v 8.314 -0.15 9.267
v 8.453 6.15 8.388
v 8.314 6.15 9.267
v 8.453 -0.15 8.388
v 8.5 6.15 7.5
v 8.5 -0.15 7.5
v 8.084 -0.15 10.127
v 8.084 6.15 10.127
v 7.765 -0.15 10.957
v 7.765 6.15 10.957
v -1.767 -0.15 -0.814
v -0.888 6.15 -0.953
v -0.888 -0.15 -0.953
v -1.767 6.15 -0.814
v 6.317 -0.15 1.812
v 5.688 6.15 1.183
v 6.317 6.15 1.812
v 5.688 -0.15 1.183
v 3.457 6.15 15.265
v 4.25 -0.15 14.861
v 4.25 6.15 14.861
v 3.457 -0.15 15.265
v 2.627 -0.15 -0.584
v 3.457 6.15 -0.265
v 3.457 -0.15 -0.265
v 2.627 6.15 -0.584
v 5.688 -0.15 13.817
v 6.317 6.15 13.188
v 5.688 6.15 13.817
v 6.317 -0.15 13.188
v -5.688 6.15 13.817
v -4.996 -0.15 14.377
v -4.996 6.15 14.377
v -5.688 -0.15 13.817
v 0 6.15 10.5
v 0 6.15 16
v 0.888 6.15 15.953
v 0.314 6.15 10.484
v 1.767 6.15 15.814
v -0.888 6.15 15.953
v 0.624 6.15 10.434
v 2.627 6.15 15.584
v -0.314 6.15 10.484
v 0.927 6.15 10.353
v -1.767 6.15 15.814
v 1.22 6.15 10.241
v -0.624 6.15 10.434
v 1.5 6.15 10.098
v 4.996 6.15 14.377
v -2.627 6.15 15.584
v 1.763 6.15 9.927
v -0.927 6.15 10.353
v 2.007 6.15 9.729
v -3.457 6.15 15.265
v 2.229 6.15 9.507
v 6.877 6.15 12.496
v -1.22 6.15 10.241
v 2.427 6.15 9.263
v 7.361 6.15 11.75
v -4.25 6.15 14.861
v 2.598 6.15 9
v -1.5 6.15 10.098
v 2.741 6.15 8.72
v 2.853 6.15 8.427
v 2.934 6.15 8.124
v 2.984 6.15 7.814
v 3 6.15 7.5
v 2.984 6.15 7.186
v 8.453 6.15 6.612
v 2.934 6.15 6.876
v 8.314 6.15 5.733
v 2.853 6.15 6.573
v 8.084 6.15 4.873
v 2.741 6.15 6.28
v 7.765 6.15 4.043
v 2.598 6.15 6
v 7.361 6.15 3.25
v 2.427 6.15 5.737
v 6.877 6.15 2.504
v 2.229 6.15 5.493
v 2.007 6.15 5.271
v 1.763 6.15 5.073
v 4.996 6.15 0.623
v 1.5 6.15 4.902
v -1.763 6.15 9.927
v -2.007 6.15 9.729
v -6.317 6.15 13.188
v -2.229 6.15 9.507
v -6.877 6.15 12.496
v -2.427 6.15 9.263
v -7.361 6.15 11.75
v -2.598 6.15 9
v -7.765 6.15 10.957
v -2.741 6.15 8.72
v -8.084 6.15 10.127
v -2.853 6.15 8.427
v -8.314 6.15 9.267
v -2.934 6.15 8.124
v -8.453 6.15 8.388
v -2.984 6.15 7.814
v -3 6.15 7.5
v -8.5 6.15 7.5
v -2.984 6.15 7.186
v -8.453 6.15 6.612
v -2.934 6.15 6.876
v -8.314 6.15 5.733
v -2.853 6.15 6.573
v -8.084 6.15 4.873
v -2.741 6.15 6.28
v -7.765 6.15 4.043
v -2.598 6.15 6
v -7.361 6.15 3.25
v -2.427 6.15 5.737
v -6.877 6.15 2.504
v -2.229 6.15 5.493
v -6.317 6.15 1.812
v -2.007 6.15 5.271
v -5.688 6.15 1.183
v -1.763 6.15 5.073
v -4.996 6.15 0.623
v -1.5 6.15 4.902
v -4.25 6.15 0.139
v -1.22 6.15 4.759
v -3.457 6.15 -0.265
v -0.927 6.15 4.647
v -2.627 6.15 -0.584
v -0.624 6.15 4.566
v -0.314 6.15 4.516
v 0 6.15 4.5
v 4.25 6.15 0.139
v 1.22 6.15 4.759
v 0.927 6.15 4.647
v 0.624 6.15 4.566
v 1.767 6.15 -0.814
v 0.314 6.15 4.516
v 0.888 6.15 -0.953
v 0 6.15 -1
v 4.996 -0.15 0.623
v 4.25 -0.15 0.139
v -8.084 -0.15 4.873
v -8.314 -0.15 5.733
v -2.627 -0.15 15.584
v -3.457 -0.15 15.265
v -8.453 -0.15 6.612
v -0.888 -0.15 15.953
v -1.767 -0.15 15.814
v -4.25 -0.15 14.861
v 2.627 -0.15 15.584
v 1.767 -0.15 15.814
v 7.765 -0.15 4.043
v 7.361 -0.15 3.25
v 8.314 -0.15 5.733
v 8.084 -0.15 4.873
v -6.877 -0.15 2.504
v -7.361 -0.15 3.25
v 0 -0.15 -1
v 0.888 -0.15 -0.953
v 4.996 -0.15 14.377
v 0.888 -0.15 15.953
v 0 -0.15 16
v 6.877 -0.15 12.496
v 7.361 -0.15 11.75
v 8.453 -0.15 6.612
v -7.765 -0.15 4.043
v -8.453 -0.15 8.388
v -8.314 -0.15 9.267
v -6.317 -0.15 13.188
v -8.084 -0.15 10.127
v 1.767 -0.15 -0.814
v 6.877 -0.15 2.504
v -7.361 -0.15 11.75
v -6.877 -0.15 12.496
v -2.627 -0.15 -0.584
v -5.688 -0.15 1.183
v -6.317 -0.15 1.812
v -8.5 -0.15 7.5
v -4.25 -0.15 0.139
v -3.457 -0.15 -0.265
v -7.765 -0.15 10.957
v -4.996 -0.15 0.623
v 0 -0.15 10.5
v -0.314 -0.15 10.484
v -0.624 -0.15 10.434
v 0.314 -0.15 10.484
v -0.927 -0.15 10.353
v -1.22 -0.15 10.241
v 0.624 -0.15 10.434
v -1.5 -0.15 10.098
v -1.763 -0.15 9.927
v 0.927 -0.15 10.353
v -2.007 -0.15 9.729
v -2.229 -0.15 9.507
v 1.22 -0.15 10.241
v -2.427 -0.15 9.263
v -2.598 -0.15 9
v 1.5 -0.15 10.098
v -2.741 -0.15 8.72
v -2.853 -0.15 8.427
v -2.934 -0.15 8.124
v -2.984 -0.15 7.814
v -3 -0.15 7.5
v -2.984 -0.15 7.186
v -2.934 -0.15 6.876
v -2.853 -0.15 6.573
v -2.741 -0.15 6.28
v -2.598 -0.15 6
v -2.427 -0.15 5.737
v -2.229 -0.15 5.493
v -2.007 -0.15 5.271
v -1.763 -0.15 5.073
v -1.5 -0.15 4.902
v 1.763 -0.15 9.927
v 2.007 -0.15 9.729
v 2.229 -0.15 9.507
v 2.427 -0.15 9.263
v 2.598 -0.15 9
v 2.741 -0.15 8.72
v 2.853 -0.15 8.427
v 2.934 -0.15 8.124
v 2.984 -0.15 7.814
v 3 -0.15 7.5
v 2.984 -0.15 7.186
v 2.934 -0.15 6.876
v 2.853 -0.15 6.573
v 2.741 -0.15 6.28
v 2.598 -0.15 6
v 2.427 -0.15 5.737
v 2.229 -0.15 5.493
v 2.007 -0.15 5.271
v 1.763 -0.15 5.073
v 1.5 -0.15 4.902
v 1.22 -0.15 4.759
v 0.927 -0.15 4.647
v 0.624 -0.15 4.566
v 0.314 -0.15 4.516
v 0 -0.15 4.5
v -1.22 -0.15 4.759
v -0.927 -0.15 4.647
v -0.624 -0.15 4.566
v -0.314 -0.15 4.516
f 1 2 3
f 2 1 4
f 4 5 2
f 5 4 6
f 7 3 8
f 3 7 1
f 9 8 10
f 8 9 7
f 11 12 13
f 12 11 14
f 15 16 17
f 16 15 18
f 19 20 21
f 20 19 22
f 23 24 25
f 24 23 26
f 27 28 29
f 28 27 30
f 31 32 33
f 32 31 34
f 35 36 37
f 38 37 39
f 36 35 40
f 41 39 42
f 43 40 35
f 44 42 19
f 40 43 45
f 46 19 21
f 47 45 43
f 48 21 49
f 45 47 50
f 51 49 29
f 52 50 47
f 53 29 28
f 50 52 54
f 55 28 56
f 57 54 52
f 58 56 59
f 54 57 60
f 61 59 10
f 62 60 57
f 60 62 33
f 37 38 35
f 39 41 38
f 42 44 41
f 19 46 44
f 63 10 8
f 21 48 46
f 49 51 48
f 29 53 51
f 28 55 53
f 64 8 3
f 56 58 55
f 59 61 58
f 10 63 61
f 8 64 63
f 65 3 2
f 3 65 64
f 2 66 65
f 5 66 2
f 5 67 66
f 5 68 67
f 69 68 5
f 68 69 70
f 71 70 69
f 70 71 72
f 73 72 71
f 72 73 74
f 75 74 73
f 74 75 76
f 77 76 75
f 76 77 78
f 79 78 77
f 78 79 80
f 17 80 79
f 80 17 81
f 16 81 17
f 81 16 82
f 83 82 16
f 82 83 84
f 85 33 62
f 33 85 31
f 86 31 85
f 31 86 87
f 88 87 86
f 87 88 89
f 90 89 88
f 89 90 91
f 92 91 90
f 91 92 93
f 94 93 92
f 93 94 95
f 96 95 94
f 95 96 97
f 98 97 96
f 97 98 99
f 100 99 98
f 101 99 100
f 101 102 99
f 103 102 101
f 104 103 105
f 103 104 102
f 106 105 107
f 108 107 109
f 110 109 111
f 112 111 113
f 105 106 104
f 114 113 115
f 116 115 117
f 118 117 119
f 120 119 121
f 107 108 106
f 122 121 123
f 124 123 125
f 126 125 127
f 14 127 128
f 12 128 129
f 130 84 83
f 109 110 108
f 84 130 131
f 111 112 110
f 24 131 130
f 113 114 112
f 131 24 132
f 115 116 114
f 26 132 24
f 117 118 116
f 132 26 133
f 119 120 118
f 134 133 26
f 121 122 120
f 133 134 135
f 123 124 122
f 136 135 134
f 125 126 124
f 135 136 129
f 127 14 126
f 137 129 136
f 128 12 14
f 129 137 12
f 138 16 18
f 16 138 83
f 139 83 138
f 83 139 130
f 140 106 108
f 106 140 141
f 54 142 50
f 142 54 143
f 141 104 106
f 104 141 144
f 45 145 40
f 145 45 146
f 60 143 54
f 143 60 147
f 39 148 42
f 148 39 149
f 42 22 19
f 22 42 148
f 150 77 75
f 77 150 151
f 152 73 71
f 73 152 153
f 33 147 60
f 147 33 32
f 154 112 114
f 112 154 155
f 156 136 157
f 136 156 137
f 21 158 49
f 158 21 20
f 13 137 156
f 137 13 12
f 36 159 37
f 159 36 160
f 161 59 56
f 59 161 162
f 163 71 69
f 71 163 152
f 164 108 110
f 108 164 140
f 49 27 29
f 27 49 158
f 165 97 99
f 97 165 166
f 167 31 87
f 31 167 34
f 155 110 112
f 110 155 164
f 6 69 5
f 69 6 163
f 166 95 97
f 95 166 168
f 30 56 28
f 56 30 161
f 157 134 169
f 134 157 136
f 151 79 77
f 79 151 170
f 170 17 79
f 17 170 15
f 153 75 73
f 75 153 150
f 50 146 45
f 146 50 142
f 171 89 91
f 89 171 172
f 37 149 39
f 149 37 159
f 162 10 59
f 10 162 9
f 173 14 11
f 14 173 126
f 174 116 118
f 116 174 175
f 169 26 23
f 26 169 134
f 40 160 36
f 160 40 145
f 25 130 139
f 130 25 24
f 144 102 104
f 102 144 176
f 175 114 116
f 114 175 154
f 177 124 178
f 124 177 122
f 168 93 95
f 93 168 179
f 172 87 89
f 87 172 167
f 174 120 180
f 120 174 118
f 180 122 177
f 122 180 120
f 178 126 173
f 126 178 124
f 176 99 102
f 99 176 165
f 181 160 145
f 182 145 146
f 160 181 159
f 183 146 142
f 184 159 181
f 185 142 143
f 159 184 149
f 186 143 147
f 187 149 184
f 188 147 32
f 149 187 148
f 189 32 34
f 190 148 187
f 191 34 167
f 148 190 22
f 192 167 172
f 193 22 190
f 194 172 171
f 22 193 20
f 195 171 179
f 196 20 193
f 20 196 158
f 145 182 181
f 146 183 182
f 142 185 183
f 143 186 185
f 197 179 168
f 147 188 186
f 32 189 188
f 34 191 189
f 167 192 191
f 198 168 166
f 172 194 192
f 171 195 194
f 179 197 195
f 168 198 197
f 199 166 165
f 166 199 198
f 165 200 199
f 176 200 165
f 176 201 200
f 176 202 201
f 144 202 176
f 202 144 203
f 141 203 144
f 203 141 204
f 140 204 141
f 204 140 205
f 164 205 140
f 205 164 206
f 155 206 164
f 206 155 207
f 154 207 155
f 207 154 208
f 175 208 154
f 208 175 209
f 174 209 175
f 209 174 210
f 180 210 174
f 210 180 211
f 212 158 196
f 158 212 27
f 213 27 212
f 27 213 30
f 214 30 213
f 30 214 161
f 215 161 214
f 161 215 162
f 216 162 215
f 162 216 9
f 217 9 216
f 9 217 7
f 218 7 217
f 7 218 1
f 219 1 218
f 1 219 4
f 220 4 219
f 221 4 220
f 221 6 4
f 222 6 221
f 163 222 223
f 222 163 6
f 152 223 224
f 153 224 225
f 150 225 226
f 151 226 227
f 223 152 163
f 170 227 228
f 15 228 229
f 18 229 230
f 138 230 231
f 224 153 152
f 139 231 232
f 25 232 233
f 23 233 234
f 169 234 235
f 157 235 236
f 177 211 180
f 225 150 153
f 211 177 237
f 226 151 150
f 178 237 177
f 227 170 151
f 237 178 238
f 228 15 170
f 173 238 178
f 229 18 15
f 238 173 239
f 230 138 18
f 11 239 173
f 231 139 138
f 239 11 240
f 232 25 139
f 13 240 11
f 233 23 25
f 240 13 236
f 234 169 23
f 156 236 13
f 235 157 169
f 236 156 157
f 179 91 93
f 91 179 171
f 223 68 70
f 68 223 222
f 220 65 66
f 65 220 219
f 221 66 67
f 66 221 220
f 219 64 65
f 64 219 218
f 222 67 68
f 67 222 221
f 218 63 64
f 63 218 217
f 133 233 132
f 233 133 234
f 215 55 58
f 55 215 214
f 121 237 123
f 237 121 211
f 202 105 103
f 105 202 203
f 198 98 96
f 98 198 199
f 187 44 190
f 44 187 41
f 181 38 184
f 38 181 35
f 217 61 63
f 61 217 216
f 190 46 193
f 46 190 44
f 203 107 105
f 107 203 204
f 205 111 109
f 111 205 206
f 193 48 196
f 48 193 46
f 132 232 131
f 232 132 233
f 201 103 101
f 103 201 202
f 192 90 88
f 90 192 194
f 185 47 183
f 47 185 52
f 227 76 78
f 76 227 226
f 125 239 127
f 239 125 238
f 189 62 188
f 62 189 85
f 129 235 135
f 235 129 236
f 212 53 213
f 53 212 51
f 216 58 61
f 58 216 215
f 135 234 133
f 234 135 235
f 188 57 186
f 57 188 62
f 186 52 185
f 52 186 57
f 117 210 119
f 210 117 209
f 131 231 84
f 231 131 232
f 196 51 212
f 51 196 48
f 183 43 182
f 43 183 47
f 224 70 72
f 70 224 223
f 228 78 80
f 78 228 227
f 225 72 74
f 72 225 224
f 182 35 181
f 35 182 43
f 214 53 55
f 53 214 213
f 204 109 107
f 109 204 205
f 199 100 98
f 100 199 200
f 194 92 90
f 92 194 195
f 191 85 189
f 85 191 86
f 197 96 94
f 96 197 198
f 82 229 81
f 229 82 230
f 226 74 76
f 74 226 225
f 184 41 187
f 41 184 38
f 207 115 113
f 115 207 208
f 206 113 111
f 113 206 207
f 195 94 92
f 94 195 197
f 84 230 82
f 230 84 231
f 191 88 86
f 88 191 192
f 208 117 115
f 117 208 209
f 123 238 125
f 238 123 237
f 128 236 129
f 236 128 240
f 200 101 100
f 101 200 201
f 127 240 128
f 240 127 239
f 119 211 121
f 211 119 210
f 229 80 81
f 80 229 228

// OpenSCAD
// file: variables.scad
radius_tr = 6/2;
radius_bolt = 4/2;
bearing_os = 17/2;
bearing_t = 6;
bread_h = 15;
c_height = bearing_os*2+radius_tr*4;

$fn=60;

connector_width=(bearing_os+radius_tr*2+radius_bolt*6)*2;
connector_height=(bread_h+radius_tr*2+6)*2 ;
// main file
$fn=60;
include <variables.scad>;

module treaded_rod(radius_tr = 6/2, length=300)
{
  color("DarkGray") 
  {
      rotate([90,0,0])  cylinder(h=length, r=radius_tr, center=true);
  }
}

module bearing()
{
  color("DarkGray") 
  {
    difference() 
    {
      rotate([90,0,0])  cylinder(h=bearing_t*1.05, r=bearing_os, center=true);  // 1.05 to make it render nice
      rotate([90,0,0])  cylinder(h=bearing_t*2, r=radius_tr, center=true);
    }
  }
}


treaded_rod();

!translate([0, radius_tr, ( bread_h)/2]) bearing();
